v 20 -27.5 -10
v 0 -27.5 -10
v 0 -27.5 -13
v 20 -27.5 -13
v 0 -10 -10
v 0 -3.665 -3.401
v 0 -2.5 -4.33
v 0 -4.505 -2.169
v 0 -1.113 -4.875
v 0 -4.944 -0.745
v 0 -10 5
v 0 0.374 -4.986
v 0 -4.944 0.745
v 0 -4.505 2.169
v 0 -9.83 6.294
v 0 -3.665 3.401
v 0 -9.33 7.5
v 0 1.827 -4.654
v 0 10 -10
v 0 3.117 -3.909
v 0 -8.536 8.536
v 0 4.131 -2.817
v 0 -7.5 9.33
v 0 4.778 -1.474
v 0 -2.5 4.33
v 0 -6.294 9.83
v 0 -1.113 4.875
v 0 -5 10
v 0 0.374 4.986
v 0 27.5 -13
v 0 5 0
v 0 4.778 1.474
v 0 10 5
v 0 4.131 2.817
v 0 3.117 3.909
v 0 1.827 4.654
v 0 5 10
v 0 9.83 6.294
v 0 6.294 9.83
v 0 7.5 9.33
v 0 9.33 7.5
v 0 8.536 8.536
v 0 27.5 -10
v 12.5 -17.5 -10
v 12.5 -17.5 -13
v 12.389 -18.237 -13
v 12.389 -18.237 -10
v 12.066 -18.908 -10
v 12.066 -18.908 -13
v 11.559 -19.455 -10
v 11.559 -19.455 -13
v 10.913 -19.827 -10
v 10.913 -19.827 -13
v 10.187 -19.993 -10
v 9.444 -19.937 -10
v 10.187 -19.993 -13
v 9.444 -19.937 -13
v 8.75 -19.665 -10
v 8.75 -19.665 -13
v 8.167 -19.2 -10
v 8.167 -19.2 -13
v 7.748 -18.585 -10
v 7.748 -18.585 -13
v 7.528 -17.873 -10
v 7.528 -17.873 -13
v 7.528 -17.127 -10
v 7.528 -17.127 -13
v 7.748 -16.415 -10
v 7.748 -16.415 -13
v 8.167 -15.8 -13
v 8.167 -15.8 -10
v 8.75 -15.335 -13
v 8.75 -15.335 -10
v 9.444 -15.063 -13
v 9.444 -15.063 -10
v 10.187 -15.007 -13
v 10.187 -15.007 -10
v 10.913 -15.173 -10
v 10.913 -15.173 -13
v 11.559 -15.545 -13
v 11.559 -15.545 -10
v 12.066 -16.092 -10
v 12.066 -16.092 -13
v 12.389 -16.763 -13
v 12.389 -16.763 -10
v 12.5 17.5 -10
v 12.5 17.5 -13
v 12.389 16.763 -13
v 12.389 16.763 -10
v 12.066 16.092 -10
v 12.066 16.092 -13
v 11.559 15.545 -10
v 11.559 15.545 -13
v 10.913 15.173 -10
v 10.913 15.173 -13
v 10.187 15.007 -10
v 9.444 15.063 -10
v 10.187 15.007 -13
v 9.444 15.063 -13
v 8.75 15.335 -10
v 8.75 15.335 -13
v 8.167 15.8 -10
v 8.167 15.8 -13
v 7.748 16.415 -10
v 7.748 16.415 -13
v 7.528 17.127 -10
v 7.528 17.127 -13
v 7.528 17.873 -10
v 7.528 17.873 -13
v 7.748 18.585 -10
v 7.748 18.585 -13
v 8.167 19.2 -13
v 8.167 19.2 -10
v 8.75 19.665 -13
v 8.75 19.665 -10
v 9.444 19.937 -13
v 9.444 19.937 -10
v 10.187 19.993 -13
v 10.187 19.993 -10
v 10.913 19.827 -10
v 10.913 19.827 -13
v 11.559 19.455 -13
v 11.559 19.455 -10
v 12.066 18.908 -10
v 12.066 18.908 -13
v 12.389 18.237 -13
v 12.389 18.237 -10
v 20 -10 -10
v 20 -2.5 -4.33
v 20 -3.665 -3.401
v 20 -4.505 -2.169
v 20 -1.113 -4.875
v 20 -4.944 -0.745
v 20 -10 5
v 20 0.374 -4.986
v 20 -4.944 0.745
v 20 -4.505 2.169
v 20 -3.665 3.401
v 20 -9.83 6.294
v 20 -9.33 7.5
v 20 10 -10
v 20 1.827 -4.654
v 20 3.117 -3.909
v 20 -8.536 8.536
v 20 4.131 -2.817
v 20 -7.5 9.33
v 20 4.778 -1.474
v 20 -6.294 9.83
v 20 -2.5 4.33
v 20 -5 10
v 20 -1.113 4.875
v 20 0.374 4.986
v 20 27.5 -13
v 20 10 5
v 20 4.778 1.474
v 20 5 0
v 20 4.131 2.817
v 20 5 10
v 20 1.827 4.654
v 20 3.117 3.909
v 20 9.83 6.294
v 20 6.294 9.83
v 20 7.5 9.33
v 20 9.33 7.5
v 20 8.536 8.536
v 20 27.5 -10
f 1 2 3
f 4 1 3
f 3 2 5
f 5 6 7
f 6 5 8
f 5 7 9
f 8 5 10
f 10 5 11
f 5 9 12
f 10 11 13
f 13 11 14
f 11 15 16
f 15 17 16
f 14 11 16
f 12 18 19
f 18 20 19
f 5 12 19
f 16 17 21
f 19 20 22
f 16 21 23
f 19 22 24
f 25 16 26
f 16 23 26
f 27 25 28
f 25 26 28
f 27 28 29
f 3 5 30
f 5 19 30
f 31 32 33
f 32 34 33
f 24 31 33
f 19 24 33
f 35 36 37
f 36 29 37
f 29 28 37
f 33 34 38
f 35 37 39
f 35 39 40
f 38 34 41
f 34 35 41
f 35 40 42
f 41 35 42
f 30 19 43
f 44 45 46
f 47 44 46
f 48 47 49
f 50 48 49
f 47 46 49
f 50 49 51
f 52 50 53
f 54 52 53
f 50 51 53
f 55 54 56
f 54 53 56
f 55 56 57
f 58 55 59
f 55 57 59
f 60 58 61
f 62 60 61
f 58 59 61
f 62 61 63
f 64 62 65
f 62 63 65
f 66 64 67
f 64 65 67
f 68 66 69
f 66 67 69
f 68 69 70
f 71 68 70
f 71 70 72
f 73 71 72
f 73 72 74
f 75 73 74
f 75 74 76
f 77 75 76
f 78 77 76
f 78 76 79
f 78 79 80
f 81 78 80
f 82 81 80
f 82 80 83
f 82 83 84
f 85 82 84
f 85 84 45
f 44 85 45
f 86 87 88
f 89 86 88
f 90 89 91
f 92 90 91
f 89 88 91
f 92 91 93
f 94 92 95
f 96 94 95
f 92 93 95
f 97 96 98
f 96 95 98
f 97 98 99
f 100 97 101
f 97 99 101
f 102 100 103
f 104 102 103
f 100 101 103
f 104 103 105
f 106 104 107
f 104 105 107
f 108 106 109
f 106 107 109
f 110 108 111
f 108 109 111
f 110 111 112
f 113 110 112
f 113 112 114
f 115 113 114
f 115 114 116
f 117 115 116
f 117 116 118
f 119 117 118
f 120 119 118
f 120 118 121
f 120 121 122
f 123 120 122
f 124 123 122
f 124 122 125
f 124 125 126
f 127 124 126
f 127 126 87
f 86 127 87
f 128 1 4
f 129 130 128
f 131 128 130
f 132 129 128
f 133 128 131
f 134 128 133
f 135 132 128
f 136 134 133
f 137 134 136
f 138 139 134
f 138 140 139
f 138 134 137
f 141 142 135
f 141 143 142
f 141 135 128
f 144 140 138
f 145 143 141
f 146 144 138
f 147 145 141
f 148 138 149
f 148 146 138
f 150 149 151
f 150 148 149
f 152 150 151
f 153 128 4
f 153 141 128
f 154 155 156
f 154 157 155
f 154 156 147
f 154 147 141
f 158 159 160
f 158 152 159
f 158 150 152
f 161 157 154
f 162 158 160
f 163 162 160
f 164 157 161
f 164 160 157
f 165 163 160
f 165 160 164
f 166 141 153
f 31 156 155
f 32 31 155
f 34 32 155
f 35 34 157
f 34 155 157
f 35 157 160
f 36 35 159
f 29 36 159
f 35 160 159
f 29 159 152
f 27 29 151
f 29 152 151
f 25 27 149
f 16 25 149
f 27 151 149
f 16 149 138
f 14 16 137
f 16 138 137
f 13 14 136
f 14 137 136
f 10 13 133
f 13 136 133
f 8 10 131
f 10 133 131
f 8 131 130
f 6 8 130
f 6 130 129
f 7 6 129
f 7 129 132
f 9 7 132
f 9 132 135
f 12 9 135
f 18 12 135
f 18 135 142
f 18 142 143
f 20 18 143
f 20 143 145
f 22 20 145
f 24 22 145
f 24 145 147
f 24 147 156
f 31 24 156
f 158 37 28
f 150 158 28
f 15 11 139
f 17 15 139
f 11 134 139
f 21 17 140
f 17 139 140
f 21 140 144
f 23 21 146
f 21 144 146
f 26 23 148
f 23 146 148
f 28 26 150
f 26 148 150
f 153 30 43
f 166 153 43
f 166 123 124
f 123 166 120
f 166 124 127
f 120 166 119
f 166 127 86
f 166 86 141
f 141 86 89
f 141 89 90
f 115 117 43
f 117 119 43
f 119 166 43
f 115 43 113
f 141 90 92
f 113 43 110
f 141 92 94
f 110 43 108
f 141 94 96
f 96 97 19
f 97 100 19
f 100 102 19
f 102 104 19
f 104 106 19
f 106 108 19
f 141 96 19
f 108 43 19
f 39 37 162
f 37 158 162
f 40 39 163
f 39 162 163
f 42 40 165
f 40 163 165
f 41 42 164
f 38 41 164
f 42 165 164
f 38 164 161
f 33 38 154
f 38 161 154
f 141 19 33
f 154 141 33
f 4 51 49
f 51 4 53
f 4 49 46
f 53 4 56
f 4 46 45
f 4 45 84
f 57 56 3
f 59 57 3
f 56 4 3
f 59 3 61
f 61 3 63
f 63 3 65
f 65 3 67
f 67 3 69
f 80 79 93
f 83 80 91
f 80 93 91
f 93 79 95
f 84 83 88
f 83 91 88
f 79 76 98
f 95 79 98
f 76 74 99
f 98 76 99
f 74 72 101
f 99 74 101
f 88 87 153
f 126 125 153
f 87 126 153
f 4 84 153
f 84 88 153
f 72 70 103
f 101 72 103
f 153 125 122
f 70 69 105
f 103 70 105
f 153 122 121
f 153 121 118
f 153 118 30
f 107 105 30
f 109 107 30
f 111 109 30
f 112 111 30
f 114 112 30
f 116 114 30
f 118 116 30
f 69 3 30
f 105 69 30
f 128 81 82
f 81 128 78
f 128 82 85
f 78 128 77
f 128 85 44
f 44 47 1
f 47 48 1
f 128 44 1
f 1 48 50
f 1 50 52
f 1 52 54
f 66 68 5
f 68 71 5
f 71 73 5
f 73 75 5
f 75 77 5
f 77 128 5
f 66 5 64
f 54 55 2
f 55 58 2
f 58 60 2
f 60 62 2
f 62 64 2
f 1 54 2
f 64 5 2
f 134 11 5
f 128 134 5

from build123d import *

# Parameters (mm, degrees)
F1_DEPTH = 20
F2_R     = 5
F3_DEPTH = 20.001
F4_R     = 5
F5_R     = 5
F6_R     = 2.5
F7_DEPTH = 23.001


with BuildPart() as f1:
    # F0 (on Right) → F1 (new body)
    with BuildSketch(Plane.YZ):
        Polygon((-27.5, -10), (-27.5, -13), (27.5, -13), (27.5, -10), (10, -10), (10, 10), (-10, 10), (-10, -10), align=None)
    extrude(amount=F1_DEPTH)

    # F2 (on face) → F3 (cut, through all)
    with BuildSketch(Plane.YZ.offset(20)):
        Circle(F2_R)
    extrude(amount=-F3_DEPTH, mode=Mode.SUBTRACT)

    # F4
    f4_edges = [f1.edges().sort_by_distance(p)[0] for p in [
        (10, -10, 10),
    ]]
    fillet(f4_edges, radius=F4_R)

    # F5
    f5_edges = [f1.edges().sort_by_distance(p)[0] for p in [
        (10, 10, 10),
    ]]
    fillet(f5_edges, radius=F5_R)

    # F6 (on face) → F7 (cut, through all)
    with BuildSketch(Plane(origin=(0, 0, -13), x_dir=(1, 0, 0), z_dir=(0, 0, -1))):
        with Locations((10, 17.5)):
            Circle(F6_R)
        with Locations((10, -17.5)):
            Circle(F6_R)
    extrude(amount=-F7_DEPTH, mode=Mode.SUBTRACT)


solid = f1.part
